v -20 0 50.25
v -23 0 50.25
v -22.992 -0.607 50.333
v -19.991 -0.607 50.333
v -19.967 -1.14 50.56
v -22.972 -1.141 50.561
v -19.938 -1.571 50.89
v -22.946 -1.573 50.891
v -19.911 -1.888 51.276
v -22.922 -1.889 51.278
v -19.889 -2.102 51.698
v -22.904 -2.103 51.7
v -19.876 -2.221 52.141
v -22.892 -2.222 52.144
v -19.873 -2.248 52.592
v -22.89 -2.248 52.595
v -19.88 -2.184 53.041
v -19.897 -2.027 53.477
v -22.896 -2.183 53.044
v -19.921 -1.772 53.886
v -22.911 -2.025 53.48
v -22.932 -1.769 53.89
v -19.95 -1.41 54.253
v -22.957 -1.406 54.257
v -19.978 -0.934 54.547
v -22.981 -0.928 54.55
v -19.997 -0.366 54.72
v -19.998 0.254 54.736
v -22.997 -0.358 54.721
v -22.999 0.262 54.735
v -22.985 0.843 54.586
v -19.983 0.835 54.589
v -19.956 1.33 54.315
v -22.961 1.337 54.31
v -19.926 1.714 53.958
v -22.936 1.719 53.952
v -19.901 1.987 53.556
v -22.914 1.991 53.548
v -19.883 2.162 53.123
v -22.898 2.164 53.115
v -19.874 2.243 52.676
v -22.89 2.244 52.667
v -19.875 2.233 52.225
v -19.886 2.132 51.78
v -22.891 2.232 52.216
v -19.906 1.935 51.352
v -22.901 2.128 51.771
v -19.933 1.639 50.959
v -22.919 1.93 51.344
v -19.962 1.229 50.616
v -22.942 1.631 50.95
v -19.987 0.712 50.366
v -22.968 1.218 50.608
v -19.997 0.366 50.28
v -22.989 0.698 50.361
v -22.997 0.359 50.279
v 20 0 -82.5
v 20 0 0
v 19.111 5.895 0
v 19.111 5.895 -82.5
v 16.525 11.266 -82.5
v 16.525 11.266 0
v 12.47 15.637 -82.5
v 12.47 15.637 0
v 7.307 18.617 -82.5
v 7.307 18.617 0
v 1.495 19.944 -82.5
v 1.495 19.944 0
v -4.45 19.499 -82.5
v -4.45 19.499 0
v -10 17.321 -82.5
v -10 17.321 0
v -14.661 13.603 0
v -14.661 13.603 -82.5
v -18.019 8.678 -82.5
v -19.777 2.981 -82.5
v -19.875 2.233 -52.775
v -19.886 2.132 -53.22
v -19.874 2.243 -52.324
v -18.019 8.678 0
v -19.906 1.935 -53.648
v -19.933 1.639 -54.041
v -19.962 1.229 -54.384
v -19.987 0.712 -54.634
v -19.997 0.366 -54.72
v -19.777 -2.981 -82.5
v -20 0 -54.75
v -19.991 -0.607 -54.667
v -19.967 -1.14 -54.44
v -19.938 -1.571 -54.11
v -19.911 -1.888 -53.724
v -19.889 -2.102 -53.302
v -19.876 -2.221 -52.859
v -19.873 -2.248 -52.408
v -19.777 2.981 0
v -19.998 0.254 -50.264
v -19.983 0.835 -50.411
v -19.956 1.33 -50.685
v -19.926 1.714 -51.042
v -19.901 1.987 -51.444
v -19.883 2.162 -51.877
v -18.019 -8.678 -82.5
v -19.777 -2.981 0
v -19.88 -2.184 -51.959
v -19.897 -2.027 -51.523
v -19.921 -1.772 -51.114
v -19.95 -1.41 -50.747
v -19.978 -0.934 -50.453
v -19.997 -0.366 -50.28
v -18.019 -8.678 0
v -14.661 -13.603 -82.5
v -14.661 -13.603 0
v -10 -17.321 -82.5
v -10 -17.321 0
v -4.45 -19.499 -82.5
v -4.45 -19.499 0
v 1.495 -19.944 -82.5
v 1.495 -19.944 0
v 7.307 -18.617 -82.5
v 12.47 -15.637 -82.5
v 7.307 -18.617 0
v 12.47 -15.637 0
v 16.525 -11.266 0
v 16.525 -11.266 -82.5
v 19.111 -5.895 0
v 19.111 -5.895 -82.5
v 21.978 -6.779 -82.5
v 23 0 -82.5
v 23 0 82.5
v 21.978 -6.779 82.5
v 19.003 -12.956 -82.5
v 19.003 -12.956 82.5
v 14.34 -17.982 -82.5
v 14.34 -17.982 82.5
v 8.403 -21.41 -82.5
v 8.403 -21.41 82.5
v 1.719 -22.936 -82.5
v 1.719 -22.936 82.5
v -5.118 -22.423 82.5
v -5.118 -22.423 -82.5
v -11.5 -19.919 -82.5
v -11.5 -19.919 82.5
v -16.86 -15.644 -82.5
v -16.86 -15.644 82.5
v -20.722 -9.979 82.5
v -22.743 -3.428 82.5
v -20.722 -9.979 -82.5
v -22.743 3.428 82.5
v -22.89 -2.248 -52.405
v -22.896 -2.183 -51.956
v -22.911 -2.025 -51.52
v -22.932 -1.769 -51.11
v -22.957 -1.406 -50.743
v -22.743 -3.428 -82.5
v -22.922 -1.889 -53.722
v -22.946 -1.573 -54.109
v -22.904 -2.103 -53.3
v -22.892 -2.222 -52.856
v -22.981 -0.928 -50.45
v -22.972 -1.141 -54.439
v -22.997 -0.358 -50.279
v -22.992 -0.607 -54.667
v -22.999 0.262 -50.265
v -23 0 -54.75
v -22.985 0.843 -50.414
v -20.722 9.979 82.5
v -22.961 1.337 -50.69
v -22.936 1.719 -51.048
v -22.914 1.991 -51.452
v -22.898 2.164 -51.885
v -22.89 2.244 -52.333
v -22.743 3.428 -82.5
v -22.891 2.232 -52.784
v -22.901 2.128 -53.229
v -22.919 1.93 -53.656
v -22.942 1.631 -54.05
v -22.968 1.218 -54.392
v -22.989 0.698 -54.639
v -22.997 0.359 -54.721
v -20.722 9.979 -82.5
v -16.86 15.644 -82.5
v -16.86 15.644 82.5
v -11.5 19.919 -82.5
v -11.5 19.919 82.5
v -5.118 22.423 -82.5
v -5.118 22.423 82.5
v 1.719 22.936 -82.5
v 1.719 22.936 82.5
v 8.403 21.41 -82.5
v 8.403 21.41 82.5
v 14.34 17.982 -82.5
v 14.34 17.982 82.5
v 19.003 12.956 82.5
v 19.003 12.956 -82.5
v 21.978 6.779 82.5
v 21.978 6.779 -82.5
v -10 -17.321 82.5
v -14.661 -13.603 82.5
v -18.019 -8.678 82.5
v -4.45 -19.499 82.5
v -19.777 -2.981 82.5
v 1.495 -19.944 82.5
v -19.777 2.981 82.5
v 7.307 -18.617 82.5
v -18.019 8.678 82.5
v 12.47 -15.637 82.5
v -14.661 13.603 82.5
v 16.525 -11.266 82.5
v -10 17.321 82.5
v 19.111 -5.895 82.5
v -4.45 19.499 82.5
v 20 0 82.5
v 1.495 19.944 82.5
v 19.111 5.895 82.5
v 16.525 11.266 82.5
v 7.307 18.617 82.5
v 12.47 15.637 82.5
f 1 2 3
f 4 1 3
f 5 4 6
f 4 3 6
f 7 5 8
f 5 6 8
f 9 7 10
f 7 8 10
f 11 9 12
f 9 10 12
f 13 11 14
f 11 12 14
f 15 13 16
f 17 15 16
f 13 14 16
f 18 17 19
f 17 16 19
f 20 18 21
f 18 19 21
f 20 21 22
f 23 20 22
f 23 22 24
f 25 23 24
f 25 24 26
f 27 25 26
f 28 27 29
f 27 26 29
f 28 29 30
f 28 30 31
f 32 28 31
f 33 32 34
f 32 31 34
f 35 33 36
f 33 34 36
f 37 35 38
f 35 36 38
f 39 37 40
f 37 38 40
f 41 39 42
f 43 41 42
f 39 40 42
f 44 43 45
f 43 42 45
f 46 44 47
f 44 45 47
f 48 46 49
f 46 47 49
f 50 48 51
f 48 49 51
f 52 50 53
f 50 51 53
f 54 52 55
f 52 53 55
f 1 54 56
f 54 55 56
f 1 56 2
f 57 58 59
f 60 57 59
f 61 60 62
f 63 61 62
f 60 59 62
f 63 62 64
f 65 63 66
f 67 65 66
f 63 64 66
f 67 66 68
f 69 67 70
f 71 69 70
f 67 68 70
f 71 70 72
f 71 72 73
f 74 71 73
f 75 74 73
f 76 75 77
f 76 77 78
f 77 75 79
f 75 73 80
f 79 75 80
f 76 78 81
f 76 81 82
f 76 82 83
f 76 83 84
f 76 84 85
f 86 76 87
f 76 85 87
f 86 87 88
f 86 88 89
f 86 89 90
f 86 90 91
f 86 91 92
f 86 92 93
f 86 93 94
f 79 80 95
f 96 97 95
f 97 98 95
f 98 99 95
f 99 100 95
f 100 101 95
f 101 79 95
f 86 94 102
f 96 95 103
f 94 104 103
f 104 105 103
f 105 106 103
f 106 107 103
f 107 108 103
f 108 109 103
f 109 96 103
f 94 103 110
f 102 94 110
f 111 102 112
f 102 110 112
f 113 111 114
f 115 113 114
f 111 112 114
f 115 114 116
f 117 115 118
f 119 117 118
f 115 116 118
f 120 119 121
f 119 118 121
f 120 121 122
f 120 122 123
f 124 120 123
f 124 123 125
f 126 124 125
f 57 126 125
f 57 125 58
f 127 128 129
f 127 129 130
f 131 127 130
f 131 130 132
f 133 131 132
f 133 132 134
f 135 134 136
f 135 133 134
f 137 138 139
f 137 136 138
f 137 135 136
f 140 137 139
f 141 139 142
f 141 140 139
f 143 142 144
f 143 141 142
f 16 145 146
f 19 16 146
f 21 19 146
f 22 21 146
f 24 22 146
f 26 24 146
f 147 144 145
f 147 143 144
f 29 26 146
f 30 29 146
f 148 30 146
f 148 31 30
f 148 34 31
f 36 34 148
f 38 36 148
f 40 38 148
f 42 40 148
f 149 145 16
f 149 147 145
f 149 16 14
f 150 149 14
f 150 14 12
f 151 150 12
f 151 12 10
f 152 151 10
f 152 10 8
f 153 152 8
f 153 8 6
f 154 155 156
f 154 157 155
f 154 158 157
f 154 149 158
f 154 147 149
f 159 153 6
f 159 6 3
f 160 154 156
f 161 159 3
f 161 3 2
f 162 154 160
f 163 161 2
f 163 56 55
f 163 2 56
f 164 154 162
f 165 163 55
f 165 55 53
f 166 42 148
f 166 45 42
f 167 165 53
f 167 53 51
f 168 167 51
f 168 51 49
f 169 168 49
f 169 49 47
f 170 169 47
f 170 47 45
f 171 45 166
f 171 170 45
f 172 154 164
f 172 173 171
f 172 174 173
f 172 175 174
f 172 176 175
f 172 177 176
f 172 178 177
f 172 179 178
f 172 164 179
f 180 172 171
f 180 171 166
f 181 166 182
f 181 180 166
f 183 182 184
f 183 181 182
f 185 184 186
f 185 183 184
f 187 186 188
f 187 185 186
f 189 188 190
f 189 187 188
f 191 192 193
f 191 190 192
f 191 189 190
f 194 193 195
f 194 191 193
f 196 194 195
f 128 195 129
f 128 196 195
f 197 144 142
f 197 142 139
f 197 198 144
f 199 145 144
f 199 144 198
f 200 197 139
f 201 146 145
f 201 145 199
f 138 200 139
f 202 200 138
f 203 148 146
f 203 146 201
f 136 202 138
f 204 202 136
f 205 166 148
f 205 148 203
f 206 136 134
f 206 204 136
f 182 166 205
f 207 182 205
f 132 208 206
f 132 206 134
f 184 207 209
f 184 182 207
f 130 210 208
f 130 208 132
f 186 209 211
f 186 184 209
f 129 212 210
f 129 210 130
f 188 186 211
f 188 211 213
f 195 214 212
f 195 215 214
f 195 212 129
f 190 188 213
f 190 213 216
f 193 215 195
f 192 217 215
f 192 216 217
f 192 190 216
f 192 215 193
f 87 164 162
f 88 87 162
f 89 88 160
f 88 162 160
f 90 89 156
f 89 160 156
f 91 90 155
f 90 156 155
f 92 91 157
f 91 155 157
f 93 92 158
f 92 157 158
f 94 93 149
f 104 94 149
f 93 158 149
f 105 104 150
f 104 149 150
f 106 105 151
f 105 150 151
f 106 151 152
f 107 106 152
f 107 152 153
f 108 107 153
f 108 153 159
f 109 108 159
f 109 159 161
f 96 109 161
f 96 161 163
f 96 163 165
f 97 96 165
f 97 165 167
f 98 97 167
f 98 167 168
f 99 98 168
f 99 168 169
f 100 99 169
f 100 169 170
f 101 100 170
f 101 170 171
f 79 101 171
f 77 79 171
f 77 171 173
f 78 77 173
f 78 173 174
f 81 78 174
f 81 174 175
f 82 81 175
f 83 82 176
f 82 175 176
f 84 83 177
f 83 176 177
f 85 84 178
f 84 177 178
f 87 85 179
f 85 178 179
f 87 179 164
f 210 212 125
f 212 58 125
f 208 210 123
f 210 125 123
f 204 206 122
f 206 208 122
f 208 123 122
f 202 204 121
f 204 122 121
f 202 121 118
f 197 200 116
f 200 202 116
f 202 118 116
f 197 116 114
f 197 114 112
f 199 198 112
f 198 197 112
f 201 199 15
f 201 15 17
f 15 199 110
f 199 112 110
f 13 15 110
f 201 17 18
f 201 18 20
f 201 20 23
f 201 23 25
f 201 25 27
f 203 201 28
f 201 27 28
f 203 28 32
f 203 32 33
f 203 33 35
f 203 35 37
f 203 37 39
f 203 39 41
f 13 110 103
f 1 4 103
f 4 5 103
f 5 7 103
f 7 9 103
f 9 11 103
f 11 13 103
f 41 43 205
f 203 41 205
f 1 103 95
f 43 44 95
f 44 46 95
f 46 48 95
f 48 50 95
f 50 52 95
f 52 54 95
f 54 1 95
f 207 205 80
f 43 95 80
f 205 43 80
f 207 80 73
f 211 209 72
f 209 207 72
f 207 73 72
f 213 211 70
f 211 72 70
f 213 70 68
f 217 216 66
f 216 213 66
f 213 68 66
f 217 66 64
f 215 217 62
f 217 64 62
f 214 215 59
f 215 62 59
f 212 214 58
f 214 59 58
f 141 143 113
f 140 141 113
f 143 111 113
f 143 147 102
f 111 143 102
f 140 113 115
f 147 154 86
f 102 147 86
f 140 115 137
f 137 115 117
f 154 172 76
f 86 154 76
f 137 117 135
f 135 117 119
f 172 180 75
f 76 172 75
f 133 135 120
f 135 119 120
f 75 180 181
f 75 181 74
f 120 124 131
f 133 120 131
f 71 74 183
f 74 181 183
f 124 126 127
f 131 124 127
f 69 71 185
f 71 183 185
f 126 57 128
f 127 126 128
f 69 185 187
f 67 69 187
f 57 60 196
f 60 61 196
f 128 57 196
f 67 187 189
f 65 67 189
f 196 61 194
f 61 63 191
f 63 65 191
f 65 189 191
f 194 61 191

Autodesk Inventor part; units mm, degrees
ref_plane "YZ Plane" through (0, 0, 0) normal (1, 0, 0) x (0, 1, 0)
ref_plane "XZ Plane" through (0, 0, 0) normal (0, 1, 0) x (-1, 0, 0)
ref_plane "XY Plane" through (0, 0, 0) normal (0, 0, 1) x (1, 0, 0)
sketch "Sketch1" plane through (0, 0, 0) normal (0, 0, 1) x (1, 0, 0)
  circle A0 centre (0, 0) radius 20
  circle A1 centre (0, 0) radius 23
  dimension "d0" = 40
  dimension "d1" = 46
extrude "Extrusion1" add sketch "Sketch1" along normal mid plane 165
sketch "Sketch2" plane through (0, 0, 0) normal (1, 0, 0) x (0, 1, 0)
  line L0 (0, 35) -> (0, -35) projected
  line L1 (-32.2, 0) -> (32.2, 0) projected
  line L2 (23, 82.5) -> (-23, 82.5) projected
  line L3 (-23, -82.5) -> (23, -82.5) projected
  line L4 (20, -82.5) -> (-20, -82.5) projected
  point P0 (0, 0)
  point P1 (0, 52.5)
  point P2 (0, -52.5)
  point P3 (0, -82.5)
  dimension "d21" = 105
  dimension "d22" = 30
  dimension "d24" = 30
hole "Hole1" at (0, 0, 52.5) at (0, 0, -52.5) direction (-1, 0, 0) diameter 4.5 end through all clearance for "Flat Head Machine Screw" size "M4" standard "Ansi Metric M Profile"
sketch "Sketch3" plane through (0, 0, 0) normal (1, 0, 0) x (0, 1, 0)
  line L0 (23, -82.5) -> (7, -82.5)
  line L1 (7, -82.5) -> (7, 82.5)
  line L2 (7, 82.5) -> (23, 82.5)
  line L3 (23, 82.5) -> (23, -82.5)
  line L4 (23, 82.5) -> (-23, 82.5) projected
  line L5 (-23, -82.5) -> (23, -82.5) projected
  line L6 (0, 35) -> (0, -35) projected
  point P0 (0, 0)
  dimension "d13" = 0
  dimension "d14" = 0
  dimension "d15" = 7
extrude "Extrusion2" [suppressed]
properties part number "Top_Separator Pipe Long" material "PVC-Piping"
